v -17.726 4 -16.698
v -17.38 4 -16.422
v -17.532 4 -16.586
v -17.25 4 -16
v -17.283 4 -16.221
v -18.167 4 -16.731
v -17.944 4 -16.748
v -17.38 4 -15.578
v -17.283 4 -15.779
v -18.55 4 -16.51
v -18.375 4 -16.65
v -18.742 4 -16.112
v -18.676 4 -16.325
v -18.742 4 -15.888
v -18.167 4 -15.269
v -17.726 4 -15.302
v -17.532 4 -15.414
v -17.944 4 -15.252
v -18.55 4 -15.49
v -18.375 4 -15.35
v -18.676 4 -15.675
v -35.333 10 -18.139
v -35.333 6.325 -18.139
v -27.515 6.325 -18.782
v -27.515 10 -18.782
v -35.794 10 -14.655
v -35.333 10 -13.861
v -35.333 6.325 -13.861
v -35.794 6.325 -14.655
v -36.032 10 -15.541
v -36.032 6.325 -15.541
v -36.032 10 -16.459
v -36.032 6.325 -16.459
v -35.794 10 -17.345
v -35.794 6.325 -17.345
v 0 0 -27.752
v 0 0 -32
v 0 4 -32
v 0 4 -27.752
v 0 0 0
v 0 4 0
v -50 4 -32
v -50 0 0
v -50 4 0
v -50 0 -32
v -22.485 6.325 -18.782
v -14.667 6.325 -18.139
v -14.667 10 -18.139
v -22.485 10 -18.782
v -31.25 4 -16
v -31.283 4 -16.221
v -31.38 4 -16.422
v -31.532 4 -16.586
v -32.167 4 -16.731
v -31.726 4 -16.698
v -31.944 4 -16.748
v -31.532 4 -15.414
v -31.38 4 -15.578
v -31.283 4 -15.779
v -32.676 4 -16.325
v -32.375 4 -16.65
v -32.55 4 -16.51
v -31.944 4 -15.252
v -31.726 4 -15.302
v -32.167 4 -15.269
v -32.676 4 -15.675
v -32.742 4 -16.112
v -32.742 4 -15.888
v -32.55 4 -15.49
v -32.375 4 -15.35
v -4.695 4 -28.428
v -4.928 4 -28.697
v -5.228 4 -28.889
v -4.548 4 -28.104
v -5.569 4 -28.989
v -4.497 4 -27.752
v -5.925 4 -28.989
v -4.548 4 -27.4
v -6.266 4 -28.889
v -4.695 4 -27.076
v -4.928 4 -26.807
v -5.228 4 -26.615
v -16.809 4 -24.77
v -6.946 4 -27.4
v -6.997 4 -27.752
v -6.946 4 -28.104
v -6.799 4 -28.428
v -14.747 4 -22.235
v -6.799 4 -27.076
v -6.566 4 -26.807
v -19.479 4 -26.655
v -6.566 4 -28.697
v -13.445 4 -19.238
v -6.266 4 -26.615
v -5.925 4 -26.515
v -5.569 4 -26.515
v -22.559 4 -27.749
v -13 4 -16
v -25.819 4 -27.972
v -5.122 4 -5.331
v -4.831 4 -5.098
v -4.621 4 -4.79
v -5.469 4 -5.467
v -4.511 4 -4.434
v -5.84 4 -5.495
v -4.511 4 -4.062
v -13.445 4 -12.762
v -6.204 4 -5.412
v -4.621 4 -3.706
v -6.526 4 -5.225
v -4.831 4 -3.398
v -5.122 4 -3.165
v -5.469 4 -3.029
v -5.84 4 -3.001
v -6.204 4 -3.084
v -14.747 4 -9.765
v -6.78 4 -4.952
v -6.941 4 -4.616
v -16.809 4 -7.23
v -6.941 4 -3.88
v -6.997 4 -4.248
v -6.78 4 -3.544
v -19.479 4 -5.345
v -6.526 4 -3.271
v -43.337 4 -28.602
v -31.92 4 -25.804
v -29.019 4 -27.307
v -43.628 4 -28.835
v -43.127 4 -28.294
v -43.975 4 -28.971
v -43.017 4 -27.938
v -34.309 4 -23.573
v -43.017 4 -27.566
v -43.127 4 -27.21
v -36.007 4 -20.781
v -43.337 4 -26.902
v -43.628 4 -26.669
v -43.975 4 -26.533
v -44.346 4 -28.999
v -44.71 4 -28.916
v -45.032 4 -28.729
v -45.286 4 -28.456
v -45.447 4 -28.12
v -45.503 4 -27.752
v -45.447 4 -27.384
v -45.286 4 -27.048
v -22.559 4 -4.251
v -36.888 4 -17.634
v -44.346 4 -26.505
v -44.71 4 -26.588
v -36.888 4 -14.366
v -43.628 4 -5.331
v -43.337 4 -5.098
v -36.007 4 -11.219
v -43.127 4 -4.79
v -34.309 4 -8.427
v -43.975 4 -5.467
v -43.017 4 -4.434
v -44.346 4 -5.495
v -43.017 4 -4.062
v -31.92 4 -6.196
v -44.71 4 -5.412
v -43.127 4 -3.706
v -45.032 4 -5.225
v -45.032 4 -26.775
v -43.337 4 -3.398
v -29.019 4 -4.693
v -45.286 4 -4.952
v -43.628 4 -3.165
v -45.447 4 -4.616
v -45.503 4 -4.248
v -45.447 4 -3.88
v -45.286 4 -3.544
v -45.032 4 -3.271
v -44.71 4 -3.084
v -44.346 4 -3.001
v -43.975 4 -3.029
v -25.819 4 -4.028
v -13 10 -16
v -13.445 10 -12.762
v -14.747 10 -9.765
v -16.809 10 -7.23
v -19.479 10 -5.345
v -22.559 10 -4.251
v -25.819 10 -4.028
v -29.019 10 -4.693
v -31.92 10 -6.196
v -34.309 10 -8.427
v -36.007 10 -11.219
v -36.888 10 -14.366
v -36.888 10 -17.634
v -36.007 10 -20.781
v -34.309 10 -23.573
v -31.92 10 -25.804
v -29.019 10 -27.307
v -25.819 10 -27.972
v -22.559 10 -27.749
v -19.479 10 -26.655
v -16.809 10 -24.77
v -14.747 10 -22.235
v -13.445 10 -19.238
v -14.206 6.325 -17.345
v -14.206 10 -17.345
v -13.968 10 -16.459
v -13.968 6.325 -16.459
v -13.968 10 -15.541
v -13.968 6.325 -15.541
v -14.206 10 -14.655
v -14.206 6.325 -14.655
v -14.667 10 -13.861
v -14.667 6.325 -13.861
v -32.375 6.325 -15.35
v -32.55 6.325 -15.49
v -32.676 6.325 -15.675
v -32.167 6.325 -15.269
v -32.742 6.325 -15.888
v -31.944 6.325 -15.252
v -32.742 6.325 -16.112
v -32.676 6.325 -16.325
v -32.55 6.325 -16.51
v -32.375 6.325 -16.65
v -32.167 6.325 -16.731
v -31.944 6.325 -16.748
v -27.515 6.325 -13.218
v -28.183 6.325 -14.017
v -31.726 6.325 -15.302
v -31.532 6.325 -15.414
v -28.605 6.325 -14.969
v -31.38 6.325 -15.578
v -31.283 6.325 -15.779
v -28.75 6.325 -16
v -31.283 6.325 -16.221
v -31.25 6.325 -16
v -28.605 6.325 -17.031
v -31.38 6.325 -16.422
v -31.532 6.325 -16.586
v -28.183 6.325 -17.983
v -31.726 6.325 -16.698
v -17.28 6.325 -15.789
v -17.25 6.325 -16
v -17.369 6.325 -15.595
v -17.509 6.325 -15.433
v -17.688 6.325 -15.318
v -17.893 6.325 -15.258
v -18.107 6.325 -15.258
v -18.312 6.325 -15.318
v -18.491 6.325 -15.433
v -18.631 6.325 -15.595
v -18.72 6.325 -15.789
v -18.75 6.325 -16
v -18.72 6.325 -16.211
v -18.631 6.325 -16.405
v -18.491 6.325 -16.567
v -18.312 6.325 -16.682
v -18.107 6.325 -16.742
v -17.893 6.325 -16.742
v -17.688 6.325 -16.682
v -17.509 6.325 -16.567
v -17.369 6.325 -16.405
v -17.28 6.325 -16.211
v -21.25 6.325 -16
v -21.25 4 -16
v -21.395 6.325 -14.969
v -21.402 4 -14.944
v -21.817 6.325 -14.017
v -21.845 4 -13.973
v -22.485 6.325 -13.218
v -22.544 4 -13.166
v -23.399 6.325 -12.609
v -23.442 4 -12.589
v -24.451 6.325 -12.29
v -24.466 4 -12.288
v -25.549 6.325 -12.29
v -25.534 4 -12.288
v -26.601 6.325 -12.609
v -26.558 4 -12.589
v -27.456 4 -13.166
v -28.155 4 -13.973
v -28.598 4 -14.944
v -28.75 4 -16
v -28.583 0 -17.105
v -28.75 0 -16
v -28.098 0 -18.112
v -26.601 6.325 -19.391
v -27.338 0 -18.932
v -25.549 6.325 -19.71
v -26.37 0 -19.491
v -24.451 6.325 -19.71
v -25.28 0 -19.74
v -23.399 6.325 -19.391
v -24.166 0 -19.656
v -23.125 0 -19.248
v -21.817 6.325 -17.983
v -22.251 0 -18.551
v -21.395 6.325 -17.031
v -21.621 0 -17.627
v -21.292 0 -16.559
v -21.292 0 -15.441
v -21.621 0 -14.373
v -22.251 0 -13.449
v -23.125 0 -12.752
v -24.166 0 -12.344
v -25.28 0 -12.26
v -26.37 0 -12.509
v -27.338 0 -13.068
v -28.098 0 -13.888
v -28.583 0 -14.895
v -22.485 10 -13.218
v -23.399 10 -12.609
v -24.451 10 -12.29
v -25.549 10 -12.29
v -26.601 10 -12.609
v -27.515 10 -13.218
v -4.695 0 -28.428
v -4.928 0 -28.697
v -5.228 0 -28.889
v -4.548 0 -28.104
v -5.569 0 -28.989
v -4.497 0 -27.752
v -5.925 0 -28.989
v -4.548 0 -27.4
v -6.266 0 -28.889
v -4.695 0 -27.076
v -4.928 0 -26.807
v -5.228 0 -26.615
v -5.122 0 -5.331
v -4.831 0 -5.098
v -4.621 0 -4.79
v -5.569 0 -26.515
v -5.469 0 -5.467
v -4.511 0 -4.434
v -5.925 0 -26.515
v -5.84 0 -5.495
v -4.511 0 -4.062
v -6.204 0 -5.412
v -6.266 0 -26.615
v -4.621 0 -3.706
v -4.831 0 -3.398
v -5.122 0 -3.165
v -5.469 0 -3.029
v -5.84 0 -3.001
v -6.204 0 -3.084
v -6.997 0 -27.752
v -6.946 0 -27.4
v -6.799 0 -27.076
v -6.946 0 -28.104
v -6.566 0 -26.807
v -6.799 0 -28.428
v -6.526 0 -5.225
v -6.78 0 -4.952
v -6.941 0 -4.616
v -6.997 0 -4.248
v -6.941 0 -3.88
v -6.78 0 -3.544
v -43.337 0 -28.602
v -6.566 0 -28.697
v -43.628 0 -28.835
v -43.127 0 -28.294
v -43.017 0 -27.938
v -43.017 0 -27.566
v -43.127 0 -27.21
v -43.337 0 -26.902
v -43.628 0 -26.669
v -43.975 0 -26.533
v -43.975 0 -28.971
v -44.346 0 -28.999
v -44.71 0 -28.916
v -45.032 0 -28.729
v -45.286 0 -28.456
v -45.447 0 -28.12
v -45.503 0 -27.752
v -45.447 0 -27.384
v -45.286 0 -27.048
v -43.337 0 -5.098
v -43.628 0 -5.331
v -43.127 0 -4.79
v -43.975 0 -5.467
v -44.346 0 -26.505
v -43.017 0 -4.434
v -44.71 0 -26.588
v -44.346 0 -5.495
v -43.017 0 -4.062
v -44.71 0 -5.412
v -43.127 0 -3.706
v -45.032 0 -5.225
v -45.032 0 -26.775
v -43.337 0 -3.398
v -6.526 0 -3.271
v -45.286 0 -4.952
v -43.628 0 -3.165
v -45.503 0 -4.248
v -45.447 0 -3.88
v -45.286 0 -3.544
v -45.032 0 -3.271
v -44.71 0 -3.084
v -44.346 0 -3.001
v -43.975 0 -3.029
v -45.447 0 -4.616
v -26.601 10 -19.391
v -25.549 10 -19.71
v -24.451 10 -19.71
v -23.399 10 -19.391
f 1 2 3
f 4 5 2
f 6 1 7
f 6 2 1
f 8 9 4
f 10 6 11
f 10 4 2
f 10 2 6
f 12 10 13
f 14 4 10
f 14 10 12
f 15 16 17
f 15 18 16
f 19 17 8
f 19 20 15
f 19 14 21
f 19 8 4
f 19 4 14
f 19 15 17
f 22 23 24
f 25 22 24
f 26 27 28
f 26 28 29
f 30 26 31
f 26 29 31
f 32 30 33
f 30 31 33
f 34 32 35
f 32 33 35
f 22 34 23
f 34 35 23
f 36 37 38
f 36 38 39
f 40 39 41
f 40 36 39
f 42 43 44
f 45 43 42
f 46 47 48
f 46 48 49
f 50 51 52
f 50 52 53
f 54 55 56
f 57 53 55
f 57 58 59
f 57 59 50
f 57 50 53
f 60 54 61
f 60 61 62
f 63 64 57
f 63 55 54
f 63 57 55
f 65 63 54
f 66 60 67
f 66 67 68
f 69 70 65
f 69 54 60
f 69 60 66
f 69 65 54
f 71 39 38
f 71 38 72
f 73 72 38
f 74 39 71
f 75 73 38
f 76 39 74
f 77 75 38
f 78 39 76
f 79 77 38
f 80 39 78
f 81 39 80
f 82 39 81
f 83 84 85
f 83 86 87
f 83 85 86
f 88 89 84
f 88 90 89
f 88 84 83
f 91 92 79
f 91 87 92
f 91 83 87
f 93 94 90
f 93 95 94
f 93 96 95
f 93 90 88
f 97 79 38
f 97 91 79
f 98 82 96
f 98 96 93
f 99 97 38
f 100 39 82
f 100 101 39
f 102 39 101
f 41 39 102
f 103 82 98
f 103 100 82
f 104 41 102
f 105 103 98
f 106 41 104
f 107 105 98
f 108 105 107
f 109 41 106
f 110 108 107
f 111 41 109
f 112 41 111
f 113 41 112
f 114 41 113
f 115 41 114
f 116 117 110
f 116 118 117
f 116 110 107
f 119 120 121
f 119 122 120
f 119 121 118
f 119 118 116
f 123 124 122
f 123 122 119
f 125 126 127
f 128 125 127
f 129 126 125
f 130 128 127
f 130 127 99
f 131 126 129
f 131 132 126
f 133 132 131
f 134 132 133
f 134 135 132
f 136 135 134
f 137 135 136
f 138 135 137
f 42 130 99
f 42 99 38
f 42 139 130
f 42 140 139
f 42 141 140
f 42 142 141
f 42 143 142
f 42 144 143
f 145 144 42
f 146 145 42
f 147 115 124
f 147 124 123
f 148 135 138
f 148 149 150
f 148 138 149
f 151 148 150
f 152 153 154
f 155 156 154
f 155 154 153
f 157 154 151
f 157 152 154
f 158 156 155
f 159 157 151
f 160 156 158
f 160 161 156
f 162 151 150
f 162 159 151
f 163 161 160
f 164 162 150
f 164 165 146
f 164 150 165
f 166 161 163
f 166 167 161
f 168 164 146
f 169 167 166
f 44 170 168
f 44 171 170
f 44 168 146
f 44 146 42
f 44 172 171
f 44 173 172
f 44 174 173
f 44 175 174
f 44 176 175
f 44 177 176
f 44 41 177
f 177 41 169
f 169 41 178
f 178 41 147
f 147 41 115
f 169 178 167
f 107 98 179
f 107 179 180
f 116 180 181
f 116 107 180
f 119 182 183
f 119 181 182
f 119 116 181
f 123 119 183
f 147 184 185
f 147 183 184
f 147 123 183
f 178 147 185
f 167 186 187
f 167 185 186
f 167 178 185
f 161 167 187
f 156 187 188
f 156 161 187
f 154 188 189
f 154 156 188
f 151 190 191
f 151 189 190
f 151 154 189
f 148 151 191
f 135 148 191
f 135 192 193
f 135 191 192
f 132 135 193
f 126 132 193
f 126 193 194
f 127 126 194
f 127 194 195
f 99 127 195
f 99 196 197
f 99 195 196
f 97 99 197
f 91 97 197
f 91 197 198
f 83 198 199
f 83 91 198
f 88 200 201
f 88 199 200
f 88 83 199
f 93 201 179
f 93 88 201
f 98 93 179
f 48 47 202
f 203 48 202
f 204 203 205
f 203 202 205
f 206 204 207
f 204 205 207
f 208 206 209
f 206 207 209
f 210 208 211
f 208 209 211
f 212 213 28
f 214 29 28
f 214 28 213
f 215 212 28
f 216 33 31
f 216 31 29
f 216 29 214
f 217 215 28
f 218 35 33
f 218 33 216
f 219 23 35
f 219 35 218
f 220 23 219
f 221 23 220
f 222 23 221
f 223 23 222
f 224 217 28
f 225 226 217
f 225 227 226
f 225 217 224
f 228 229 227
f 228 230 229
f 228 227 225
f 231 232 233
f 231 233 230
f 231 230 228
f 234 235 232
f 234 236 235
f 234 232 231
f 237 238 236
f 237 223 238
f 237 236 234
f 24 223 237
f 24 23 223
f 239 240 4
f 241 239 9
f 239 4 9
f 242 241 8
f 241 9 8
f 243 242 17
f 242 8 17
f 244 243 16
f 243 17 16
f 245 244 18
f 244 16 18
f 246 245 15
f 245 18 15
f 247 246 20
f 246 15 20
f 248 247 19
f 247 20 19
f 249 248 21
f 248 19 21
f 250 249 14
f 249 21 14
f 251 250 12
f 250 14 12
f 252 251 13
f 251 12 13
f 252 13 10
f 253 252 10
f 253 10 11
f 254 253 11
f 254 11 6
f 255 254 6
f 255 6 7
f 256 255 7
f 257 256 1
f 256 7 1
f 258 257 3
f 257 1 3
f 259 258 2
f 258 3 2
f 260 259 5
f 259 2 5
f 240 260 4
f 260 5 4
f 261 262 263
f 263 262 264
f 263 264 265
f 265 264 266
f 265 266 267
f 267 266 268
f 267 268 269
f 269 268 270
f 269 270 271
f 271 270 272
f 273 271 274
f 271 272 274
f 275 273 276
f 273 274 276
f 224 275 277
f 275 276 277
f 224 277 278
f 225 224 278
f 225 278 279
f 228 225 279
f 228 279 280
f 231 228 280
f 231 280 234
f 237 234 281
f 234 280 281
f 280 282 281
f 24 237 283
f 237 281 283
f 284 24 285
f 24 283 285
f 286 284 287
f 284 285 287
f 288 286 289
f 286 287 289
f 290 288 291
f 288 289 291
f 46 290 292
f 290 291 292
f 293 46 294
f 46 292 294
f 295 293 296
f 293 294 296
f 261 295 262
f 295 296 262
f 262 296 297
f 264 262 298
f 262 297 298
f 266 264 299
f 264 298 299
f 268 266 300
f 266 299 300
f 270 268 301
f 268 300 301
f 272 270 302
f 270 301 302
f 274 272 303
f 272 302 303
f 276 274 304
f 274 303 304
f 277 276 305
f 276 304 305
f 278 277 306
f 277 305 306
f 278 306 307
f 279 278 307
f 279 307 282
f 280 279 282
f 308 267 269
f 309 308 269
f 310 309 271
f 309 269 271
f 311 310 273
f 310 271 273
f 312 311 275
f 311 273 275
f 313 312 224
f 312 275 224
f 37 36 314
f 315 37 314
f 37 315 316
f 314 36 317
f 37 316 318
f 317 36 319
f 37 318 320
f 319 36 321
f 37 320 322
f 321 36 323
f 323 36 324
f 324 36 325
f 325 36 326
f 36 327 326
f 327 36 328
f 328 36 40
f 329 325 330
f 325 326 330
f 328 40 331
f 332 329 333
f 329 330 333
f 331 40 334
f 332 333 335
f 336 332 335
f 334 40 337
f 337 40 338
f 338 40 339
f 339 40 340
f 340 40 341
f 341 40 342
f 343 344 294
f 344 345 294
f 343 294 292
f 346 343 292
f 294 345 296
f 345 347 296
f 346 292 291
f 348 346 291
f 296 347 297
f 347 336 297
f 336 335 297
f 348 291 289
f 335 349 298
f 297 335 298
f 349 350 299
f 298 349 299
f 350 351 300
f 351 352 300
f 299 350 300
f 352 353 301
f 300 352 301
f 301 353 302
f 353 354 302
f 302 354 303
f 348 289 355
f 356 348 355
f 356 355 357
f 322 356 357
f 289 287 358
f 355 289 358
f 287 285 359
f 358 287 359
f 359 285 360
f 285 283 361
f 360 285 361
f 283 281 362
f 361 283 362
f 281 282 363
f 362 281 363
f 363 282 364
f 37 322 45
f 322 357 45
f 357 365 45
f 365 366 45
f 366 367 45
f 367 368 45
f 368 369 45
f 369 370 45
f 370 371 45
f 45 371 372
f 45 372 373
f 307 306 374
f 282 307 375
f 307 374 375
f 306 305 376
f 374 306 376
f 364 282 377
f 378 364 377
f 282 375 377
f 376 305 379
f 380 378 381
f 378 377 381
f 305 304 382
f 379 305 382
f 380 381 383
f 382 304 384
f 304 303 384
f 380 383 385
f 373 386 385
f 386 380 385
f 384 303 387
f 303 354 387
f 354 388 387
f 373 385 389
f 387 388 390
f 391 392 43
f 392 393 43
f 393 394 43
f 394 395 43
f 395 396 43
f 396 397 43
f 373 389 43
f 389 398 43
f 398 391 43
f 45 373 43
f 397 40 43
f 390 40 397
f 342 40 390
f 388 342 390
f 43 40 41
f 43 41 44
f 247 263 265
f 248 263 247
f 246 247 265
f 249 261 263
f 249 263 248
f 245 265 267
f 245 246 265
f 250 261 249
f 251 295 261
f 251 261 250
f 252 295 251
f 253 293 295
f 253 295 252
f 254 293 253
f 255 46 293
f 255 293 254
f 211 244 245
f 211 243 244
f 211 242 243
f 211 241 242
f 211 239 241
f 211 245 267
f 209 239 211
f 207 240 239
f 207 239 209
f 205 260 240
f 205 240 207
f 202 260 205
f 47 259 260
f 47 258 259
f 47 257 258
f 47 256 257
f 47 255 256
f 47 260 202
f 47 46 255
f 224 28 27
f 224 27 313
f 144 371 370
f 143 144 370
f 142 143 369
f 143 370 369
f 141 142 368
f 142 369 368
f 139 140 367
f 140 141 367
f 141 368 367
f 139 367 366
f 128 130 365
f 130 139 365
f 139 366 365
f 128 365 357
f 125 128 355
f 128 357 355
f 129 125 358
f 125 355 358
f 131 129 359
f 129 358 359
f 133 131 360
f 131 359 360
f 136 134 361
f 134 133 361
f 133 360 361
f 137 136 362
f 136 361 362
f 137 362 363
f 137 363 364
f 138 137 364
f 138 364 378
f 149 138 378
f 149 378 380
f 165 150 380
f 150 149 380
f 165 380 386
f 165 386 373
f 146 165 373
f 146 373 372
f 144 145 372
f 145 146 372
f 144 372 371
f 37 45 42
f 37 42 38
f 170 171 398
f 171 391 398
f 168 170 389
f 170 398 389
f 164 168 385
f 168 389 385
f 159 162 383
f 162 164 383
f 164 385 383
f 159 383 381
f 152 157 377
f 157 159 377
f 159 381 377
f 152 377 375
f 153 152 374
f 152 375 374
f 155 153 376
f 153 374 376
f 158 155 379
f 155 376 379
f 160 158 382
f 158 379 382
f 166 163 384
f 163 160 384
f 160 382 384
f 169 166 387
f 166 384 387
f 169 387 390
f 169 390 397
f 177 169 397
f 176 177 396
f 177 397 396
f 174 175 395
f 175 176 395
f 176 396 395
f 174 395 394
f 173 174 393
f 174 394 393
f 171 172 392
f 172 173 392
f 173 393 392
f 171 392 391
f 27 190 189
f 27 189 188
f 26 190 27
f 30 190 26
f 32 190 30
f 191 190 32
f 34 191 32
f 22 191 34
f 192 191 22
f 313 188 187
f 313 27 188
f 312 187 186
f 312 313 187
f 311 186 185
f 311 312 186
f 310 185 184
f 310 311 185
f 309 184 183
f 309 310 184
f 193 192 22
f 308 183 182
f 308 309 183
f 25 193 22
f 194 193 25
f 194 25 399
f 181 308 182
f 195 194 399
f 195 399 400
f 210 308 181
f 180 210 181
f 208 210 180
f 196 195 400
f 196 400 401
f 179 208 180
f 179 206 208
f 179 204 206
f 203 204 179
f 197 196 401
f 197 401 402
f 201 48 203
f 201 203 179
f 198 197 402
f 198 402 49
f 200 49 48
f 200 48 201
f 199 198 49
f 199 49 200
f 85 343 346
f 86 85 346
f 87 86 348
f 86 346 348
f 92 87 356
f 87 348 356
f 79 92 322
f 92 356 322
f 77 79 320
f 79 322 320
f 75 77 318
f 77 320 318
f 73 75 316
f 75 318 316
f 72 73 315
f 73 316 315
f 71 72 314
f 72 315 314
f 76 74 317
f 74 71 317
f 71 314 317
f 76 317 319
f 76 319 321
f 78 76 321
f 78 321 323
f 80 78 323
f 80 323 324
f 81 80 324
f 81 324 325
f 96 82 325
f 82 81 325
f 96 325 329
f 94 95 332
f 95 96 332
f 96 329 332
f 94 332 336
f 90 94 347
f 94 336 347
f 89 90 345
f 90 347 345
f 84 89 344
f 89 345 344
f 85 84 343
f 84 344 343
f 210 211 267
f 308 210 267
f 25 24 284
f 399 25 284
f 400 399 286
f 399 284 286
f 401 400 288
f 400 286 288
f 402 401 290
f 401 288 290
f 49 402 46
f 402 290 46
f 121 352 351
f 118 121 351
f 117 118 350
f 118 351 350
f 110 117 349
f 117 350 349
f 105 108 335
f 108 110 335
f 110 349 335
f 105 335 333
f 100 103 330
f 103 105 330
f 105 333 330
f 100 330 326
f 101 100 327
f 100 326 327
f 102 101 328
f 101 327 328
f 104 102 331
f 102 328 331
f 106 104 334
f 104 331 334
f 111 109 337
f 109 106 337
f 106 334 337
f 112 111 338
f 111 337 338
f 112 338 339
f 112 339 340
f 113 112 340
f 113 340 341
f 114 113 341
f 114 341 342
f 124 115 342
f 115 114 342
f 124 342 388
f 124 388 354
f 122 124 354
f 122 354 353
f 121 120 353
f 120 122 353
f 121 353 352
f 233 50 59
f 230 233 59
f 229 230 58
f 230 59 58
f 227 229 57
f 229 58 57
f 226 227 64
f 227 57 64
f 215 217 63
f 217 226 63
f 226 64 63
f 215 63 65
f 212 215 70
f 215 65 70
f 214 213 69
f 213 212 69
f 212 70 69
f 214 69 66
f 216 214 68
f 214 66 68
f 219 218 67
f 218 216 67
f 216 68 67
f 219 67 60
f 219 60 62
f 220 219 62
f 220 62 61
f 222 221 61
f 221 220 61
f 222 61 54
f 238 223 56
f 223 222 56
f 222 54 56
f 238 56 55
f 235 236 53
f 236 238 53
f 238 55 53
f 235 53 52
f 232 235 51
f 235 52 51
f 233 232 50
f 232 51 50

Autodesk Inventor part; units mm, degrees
ref_plane "YZ Plane" through (0, 0, 0) normal (1, 0, 0) x (0, 1, 0)
ref_plane "XZ Plane" through (0, 0, 0) normal (0, 1, 0) x (-1, 0, 0)
ref_plane "XY Plane" through (0, 0, 0) normal (0, 0, 1) x (1, 0, 0)
sketch "Sketch1" plane through (0, 0, 0) normal (0, 1, 0) x (-1, 0, 0)
  line L0 (0, 0) -> (50, 0)
  line L1 (50, 0) -> (50, -32)
  line L2 (50, -32) -> (0, -32)
  line L3 (0, -32) -> (0, 0)
  line L4 (0, -27.752) -> (5.747, -27.752)
  circle A0 centre (5.747, -27.752) radius 1.25
  line L5 (25, 0) -> (25, -16) construction
  line L6 (25, -16) -> (0, -16) construction
  circle A1 centre (5.747, -4.248) radius 1.25
  circle A2 centre (44.253, -27.752) radius 1.25
  circle A3 centre (44.253, -4.248) radius 1.25
  circle A4 centre (25, -16) radius 3.75
  dimension "d0" = 50
  dimension "d1" = 32
  dimension "d2" = 5.747
  dimension "d3" = 4.248
  dimension "d4" = 2.5
  dimension "d5" = 7.5
extrude "Extrusion1" add sketch "Sketch1" along normal blind 4
sketch "Sketch2" plane through (0, 4, 0) normal (0, 1, 0) x (1, 0, 0)
  circle A0 centre (-25, 16) radius 3.75 projected
  circle A1 centre (-25, 16) radius 12
  line L0 (-25, 16) -> (-32, 16)
  line L1 (-25, 16) -> (-18, 16)
  circle A2 centre (-32, 16) radius 0.75
  circle A3 centre (-18, 16) radius 0.75
  point P0 (0, 0)
  dimension "d8" = 24
  dimension "d9" = 7
  dimension "d10" = 7
  dimension "d11" = 1.5
  dimension "d12" = 1.5
extrude "Extrusion2" add sketch "Sketch2" along normal blind 2.325
sketch "Sketch3" plane through (-25, 6.325, -16) normal (0, 1, 0) x (1, 0, 0)
  circle A0 centre (0, 0) radius 12 projected
  circle A1 centre (0, 0) radius 3.75 projected
  circle A2 centre (-7, 0) radius 0.75 projected
  circle A3 centre (7, 0) radius 0.75 projected
  line L0 (-7, 0) -> (-7.5625, 0)
  line L1 (-7, 0) -> (-7, -2.877)
  line L2 (-7, 0) -> (-10.333, 0)
  line L3 (-10.333, 2.1388) -> (-10.333, 2.277)
  line L4 (-10.333, -2.1388) -> (-10.333, -2.277)
  line L5 (-10.333, -2.1388) -> (-10.005, -2.1388)
  line L6 (-10.333, -2.1388) -> (-2.5151, -2.7815)
  line L7 (-10.333, -2.1388) -> (-2.4887, -2.1388) construction
  line L8 (0, 0) -> (0, 2.5608)
  line L9 (-10.333, 2.1388) -> (-2.5151, 2.7815)
  arc A4 (-5.1785, -2.5625) -> (-4.792, -2.1388) centre (-7.5625, 0) ccw
  arc A5 (-10.333, 2.1388) -> (-10.333, -2.1388) centre (-7.5625, 0) ccw
  line L10 (10.333, -2.1388) -> (2.5151, -2.7815)
  line L11 (10.333, 2.1388) -> (2.5151, 2.7815)
  arc A6 (10.333, -2.1388) -> (10.333, 2.1388) centre (7.5625, 0) ccw
  arc A7 (-3.0803, -2.1388) -> (2.5151, -2.7815) centre (0, 0) ccw
  arc A8 (2.5151, 2.7815) -> (-2.5151, 2.7815) centre (0, 0) ccw
  point P0 (25, -16)
  dimension "d15" = 0.5625
  dimension "d17" = 2.877
  dimension "d18" = 3.333
  dimension "d20" = 2.277
  dimension "d21" = 4.7
extrude "Extrusion3" add sketch "Sketch3" along normal blind 3.675 contours A0
properties part number "base"
